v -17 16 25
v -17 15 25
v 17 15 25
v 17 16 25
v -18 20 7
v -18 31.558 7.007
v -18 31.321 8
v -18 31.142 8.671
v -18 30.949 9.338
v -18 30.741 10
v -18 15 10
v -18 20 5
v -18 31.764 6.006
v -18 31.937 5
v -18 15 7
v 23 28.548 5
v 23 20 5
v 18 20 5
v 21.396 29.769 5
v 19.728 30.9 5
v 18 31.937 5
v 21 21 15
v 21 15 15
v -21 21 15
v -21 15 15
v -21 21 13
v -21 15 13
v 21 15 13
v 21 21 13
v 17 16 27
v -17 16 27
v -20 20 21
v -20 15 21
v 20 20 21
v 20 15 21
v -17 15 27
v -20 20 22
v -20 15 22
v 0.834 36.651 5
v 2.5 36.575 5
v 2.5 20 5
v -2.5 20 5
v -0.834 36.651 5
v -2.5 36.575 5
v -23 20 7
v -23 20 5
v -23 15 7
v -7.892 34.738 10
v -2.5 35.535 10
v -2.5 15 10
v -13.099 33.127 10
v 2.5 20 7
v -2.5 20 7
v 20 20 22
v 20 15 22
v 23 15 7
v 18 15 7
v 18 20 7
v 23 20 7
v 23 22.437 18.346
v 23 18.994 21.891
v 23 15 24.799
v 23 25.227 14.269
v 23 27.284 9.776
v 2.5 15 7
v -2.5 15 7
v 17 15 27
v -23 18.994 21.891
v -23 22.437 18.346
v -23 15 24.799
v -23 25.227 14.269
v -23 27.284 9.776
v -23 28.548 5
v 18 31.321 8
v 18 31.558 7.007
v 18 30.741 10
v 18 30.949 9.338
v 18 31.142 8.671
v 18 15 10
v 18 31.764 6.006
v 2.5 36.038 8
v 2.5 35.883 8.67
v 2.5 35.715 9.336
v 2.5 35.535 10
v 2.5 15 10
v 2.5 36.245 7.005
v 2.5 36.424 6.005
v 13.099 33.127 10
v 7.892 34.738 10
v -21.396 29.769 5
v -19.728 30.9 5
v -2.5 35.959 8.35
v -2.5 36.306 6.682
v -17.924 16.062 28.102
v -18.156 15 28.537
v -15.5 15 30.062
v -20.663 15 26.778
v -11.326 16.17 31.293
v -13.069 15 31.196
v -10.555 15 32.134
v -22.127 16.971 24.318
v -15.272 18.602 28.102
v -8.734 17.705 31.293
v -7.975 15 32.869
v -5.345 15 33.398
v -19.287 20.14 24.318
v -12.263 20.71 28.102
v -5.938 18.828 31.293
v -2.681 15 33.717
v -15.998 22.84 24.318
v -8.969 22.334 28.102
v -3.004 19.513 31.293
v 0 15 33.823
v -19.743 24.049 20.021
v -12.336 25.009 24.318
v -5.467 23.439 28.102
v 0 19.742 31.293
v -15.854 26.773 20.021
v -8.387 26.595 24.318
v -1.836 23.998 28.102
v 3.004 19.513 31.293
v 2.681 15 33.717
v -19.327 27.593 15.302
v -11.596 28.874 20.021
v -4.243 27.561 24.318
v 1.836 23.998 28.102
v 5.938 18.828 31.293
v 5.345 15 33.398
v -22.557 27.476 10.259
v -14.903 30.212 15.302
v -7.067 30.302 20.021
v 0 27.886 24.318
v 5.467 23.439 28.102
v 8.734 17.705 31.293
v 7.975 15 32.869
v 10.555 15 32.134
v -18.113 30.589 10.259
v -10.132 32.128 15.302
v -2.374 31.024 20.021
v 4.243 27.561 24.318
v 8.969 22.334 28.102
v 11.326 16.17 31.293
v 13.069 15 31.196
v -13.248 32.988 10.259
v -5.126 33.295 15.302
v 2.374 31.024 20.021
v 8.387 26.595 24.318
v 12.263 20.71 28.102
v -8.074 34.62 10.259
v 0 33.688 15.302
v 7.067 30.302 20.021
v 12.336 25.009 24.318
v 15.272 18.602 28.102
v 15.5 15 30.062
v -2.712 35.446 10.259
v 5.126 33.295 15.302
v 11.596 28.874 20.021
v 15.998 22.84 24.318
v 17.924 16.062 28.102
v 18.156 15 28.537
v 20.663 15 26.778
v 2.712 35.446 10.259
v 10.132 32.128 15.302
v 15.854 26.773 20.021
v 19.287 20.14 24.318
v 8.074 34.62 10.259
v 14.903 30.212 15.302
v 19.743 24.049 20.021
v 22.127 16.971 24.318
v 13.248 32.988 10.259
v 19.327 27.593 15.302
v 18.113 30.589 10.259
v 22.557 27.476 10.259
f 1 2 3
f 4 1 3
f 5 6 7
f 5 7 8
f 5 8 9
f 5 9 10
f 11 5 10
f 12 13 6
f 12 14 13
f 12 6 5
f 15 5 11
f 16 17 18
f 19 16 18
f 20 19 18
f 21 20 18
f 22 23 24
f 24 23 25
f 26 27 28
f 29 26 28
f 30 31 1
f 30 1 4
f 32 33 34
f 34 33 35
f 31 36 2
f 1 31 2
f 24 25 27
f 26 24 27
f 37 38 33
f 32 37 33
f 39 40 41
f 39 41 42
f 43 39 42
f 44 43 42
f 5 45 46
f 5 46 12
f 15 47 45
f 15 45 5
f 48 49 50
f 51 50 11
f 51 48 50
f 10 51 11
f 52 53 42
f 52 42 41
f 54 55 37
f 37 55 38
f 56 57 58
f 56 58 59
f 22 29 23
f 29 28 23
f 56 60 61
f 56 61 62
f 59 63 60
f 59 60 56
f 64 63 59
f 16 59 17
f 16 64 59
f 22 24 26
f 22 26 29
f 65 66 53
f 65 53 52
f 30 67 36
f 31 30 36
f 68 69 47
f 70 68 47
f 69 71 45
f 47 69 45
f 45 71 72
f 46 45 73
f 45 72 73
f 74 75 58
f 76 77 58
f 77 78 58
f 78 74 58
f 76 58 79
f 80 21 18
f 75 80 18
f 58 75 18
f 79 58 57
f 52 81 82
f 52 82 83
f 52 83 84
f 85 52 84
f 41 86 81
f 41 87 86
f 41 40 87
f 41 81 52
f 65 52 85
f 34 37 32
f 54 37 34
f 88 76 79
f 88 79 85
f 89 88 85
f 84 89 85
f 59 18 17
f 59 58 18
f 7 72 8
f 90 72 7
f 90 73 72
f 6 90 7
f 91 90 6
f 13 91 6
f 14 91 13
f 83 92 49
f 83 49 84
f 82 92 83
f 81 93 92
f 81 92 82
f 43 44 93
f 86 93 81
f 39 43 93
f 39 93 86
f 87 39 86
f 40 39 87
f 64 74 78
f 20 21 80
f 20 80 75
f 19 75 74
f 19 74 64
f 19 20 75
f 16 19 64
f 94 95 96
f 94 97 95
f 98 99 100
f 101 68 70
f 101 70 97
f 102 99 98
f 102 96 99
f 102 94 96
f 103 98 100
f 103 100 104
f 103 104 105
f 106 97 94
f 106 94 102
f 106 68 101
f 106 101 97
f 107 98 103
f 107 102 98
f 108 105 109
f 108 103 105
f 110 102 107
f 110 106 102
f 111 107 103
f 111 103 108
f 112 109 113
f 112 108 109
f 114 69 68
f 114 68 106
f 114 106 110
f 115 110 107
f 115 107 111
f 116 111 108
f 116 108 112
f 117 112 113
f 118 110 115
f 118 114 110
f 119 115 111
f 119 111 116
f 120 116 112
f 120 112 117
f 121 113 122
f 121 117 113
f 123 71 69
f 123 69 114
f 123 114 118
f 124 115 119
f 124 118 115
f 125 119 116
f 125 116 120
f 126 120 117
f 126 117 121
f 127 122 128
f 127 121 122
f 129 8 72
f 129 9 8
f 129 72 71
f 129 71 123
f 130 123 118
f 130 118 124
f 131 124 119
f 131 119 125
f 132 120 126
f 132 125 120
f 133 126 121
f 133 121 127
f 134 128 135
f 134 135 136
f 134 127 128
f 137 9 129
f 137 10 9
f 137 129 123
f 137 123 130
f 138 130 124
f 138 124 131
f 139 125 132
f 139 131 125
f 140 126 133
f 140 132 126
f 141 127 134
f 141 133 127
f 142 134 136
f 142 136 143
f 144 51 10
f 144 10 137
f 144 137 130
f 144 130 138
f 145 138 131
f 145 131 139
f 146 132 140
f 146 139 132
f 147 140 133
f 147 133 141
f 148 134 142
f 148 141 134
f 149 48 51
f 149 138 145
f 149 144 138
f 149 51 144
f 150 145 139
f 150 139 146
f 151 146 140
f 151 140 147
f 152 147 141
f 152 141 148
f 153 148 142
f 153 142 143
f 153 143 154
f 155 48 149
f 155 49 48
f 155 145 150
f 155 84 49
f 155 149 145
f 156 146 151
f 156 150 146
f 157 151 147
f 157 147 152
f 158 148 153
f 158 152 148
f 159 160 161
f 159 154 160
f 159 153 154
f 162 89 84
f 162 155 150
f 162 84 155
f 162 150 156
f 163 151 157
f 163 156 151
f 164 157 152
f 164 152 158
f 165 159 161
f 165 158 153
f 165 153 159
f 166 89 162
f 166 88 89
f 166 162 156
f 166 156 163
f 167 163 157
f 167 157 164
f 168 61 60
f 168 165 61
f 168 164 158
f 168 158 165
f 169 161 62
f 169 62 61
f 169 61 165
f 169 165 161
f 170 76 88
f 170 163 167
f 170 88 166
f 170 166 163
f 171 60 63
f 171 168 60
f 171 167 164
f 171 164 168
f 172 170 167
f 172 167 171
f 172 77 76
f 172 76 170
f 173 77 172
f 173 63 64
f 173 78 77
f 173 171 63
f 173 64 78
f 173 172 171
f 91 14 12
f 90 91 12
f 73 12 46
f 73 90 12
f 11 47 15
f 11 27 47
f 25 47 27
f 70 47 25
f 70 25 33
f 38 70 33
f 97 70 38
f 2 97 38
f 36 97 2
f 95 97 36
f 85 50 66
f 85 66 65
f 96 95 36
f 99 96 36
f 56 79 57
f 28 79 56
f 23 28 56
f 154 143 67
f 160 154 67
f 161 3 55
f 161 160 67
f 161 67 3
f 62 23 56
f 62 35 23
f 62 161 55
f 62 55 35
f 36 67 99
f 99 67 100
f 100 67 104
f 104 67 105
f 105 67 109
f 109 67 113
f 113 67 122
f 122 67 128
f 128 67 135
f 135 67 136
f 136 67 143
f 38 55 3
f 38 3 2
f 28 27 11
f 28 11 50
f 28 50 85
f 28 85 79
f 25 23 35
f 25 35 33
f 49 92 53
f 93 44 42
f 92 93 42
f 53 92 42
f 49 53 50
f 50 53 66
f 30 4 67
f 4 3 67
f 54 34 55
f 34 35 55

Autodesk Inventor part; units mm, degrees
sketch "スケッチ1" plane through (0, 0, 0) normal (0, 1, 0) x (-1, 0, 0)
  circle A0 centre (0, 0) radius 37
  line L0 (0, 0) -> (0, -37)
  line L1 (0, 0) -> (0, 37)
  dimension "d0" = 74
revolve "回転1" add sketch "スケッチ1" angle 180 about axis through (0, 0, 0) along (0, 0, 1) picked at (-2.7444, -24.3574) contours L1 L0 A0
sketch "スケッチ5" plane through (0, 0, 0) normal (0, -1, 0) x (1, 0, 0)
  line L0 (-20, -25) -> (20, -25)
  line L1 (20, -25) -> (20, -15)
  line L2 (20, -15) -> (-20, -15)
  line L3 (-20, -15) -> (-20, -25)
  line L4 (-20, -17) -> (-20, -15)
  line L5 (0, 27) -> (-17, 27)
  line L6 (-17, 27) -> (-17, 25)
  line L7 (-17, 25) -> (0, 25)
  line L8 (0, 25) -> (0, 27)
  line L9 (0, 22) -> (-20, 22)
  line L10 (-20, 22) -> (-20, 21)
  line L11 (-20, 21) -> (0, 21)
  line L12 (0, 21) -> (0, 22)
  line L13 (0, 15) -> (-21, 15)
  line L14 (-21, 15) -> (-21, 13)
  line L15 (-21, 13) -> (0, 13)
  line L16 (0, 13) -> (0, 15)
  line L17 (0, 7) -> (-23, 7)
  line L18 (-23, 7) -> (-23, 5)
  line L19 (-23, 5) -> (0, 5)
  line L20 (0, 5) -> (0, 7)
  circle A0 centre (0, 0) radius 37 projected
  circle A1 centre (0, 0) radius 37 projected
  line L21 (0, 37) -> (0, -37)
  line L22 (37, 0) -> (-37, 0)
  line L23 (-32, 4) -> (-23, 4)
  line L24 (-23, 4) -> (-23, -6)
  line L25 (-23, -6) -> (-32, -6)
  line L26 (-32, -6) -> (-32, 4)
  line L27 (-23, -8.0262) -> (-23, 4)
  line L28 (-27, 25.2982) -> (-27, -25.2982)
  line L29 (-15.5, 27) -> (-12, 27)
  line L30 (-12, 27) -> (-12, 35)
  line L31 (-12, 35) -> (-15.5, 35)
  line L32 (-15.5, 35) -> (-15.5, 27)
  line L33 (-15.5, 25) -> (0, 25)
  line L34 (0, 25) -> (0, 22)
  line L35 (0, 22) -> (-15.5, 22)
  line L36 (-15.5, 22) -> (-15.5, 25)
  line L37 (-19, 15) -> (0, 15)
  line L38 (0, 15) -> (0, 21)
  line L39 (0, 21) -> (-19, 21)
  line L40 (-19, 21) -> (-19, 15)
  line L41 (-19, 13) -> (0, 13)
  line L42 (0, 13) -> (0, 7)
  line L43 (0, 7) -> (-19, 7)
  line L44 (-19, 7) -> (-19, 13)
  line L45 (-23, -1) -> (-39.6865, -1)
  line L46 (-23, -1) -> (-7.8337, -1)
  line L47 (-8, 5) -> (-23, 5)
  line L48 (-23, 5) -> (-23, -7)
  line L49 (-23, -7) -> (-8, -7)
  line L50 (-8, -7) -> (-8, 5)
  line L51 (-8, 5) -> (-23, -7) construction
  line L52 (-23, 5) -> (-8, -7) construction
  line L53 (-23, 6) -> (-33, 6)
  line L54 (-33, 6) -> (-33, -8)
  line L55 (-33, -8) -> (-23, -8)
  line L56 (-23, -8) -> (-23, 6)
  line L57 (-23, 6) -> (-33, -8) construction
  line L58 (-33, 6) -> (-23, -8) construction
  line L59 (-8, 5) -> (-1, 5)
  line L60 (-1, 5) -> (-1, -7)
  line L61 (-1, -7) -> (-8, -7)
  line L62 (-8, -7) -> (-8, 5)
  line L63 (-8, 5) -> (-1, -7) construction
  line L64 (-1, 5) -> (-8, -7) construction
  line L65 (-23, 4) -> (-27, 4)
  line L66 (-23, -6) -> (-27, -6)
  line L67 (-23, 6) -> (-27, 6)
  line L68 (-23, -8) -> (-27, -8)
  line L69 (26.3249, -26) -> (-26.3249, -26)
  line L70 (-8, 5) -> (-6.8, 5)
  line L71 (-6.8, 5) -> (-6.8, -7)
  line L72 (-6.8, -7) -> (-8, -7)
  line L73 (-8, -7) -> (-8, 5)
  line L74 (-3, 7) -> (0, 7)
  line L75 (0, 22) -> (-4, 22)
  line L76 (-4, 21) -> (0, 21)
  line L77 (0, 21) -> (0, 22)
  line L78 (-6, 7) -> (-1, 7)
  line L79 (-1, 5) -> (-6, 5)
  point P0 (0, -25)
  point P1 (0, -15)
  point P2 (0, 26)
  point P3 (0, 21.5)
  point P4 (0, 14)
  point P5 (0, 6)
  point P6 (-20, -20)
  point P7 (-27, -0.5262)
  point P8 (-15.5, 23.5)
  point P9 (-15.5, 33.5969)
  point P10 (0, 27)
  point P11 (0, 37)
  point P12 (0, 25)
  point P13 (0, 13)
  point P14 (0, 15)
  point P15 (-27, 0)
  point P16 (-32, 0)
  point P17 (-23, 0)
  point P18 (-15.5, -1)
  point P19 (-28, -1)
  point P20 (-4.5, -1)
  point P21 (-8, 5)
  point P22 (-27, 0.5)
  point P23 (-28, 0.4738)
  point P24 (-28, -11.5262)
  point P25 (-27, -11.5)
  point P26 (-23, -6)
  point P27 (-23, 4)
  point P28 (-23, 4)
  point P29 (-23, -6)
  point P30 (-23, -7)
  point P31 (-8, 0)
  point P32 (-1, 0)
  point P33 (-26.3249, -26)
  point P34 (0, 22)
  point P35 (-27, 6)
  point P36 (-19, 10)
  dimension "d12" = 40
  dimension "d13" = 10
  dimension "d23" = 17
  dimension "d24" = 2
  dimension "d27" = 20
  dimension "d28" = 1
  dimension "d30" = 21
  dimension "d31" = 2
  dimension "d33" = 2
  dimension "d88" = 0
  dimension "d89" = 0
  dimension "d90" = 12
  dimension "d92" = 20
  dimension "d93" = 10
  dimension "d97" = 9
  dimension "d98" = 10
  dimension "d113" = 27
  dimension "d122" = 15.5
  dimension "d123" = 35
  dimension "d124" = 3
  dimension "d125" = 15.5
  dimension "d126" = 6
  dimension "d127" = 6
  dimension "d147" = 12
  dimension "d149" = 8
  dimension "d151" = 15
  dimension "d161" = 14
  dimension "d162" = 10
  dimension "d164" = 12
  dimension "d165" = 7
  dimension "d170" = 26
  dimension "d175" = 1.2
  dimension "d207" = 0
  dimension "d283" = 2
  dimension "d284" = 2
extrude "GNSボード" cut sketch "スケッチ5" against normal blind 16 contours L8 L7 L6 L5
extrude "GNSボード止めるよう" cut sketch "スケッチ5" against normal blind 15 contours L21 L5 L30 A0 | L30 L5 L32 A0 | L21 L9 L36 L7
extrude "アルミ板１" cut sketch "スケッチ5" against normal blind 20 contours L11 L10 L9 L12
extrude "メイン基板" cut sketch "スケッチ5" against normal blind 21 contours L15 L14 L13 L16
extrude "メイン止めるよう" cut sketch "スケッチ5" against normal blind 14.5 contours L17 L44 L15 L21 | L13 L40 L11 L21
extrude "アルミ板２" cut sketch "スケッチ5" against normal blind 20 contours L19 L18 L17 L20
extrude "電池ボックス入れ" cut sketch "スケッチ5" against normal blind 13 contours L3 L2 L21 L0 | L21 L2 L1 L0
extrude "side ut" cut sketch "スケッチ5" against normal blind 100 contours A0 L45 L54 L55 L28 | A0 L22 L54 L45 | L55 L54 L45 L26 L25 L28 | A0 L28 L53 L54 L22 | L54 L22 L26 L45 | L25 L26 L45 L28 | L54 L53 L28 L23 L26 L22 | L26 L22 L28 L45 | L22 L26 L23 L28
extrude "motor case" add sketch "スケッチ5" against normal blind 7 contours L55 L54 L45 L26 L25 L28 | L28 L25 L27 L55 | L50 L46 L24 L22 | L22 L24 L48 L19 L50 | L54 L22 L26 L45 | L28 L45 L24 L25 | L25 L26 L45 L28 | L24 L45 L28 L22 | L22 L28 L23 L24 | L50 L49 L27 L24 L46 | L54 L53 L28 L23 L26 L22 | L26 L22 L28 L45 | L22 L26 L23 L28 | L23 L28 L53 L18 L48
extrude "bottom cut" cut sketch "スケッチ5" against normal blind 90 contours L69 A0 L21 | L21 A0 L69
extrude "motor" cut sketch "スケッチ5" against normal blind 6 contours L60 L61 L71 L22 | L22 L71 L19 L60 | L71 L61 L50 L22 | L22 L50 L19 L71 | L50 L46 L24 L22 | L22 L24 L48 L19 L50 | L28 L45 L24 L25 | L25 L26 L45 L28 | L24 L45 L28 L22 | L22 L28 L23 L24 | L50 L49 L27 L24 L46 | L26 L22 L28 L45 | L22 L26 L23 L28
extrude "motor block" add sketch "スケッチ5" against normal blind 10 contours L71 L61 L50 L22 | L22 L50 L19 L71
sketch "スケッチ27" plane through (-33, 0, -8) normal (-1, 0, 0) x (0, 0, 1)
  line L0 (14, 0) -> (0, 0) projected
  circle A0 centre (7, 0) radius 3
  point P0 (8, 0)
  dimension "d198" = 6
extrude "押し出し36" cut sketch "スケッチ27" against normal blind 27
mirror "ミラー13" about plane through (0, 0, 0) normal (1, 0, 0) of "メイン止めるよう", "メイン基板", "アルミ板１", "GNSボード止めるよう", "GNSボード", "アルミ板２", "motor", "motor case", "押し出し36", "電池ボックス入れ", "side ut", "motor block"
ref_plane "作業平面5" through (-17, 17.5, 25) normal (0, -1, 0) x (1, 0, 0)
ref_plane "作業平面6" through (20, 13, -15) normal (0, 0, -1) x (1, 0, 0)
sketch "スケッチ38" plane through (20, 13, -15) normal (0, 0, -1) x (1, 0, 0)
  line L0 (-40, 13) -> (0, 13) projected
  line L1 (-40, 13) -> (-40, 0) projected
  line L2 (-40, 0) -> (0, 0) projected
  line L3 (0, 13) -> (0, 0) projected
  line L4 (-38, 6) -> (-28, 6)
  line L5 (-28, 6) -> (-28, -3)
  line L6 (-28, -3) -> (-38, -3)
  line L7 (-38, -3) -> (-38, 6)
  point P0 (-20, 13)
  dimension "d235" = 3
  dimension "d236" = 9
  dimension "d237" = 10
  dimension "d238" = 2
extrude "押し出し44" cut sketch "スケッチ38" against normal blind 18 contours L7 L4 L5 L2 | L2 L5 L6 L7
ref_plane "作業平面7" through (27, 35, 6) normal (0, -1, 0) x (1, 0, 0)
sketch "スケッチ41" plane through (-17, 0, 25) normal (0, -1, 0) x (1, 0, 0)
  line L0 (-16, -23) -> (-15, -23) projected
  line L1 (-15, -23) -> (-15, -21) projected
  line L2 (-15, -21) -> (-6, -21) projected
  line L3 (-6, -21) -> (-6, -18) projected
  line L4 (-6, -18) -> (-2, -18) projected
  line L5 (-2, -18) -> (-2, -12) projected
  line L6 (-2, -12) -> (-4, -12) projected
  line L7 (-4, -12) -> (-4, -10) projected
  line L8 (-4, -10) -> (-2, -10) projected
  line L9 (-2, -10) -> (-2, -4) projected
  line L10 (-2, -4) -> (-3, -4) projected
  line L11 (-3, -4) -> (-3, -3) projected
  line L12 (-3, -3) -> (1.5, -3) projected
  line L13 (1.5, -3) -> (1.5, 0) projected
  line L14 (1.5, 0) -> (0, 0) projected
  line L15 (0, 0) -> (0, 2) projected
  line L16 (0, 2) -> (1.5, 2) projected
  line L17 (1.5, 2) -> (1.5, 8.5969) projected
  arc A0 (1.5, 8.5969) -> (-10, 0.2982) centre (17, -25) ccw projected
  line L18 (-10, 0.2982) -> (-10, -19) projected
  line L19 (-10, -19) -> (-16, -19) projected
  line L20 (-16, -19) -> (-16, -23) projected
  line L21 (-2, -18) -> (-2, -12) projected
  line L22 (-4, -10) -> (-4, -12) projected
  line L23 (0, 2) -> (0, 0) projected
  circle A1 centre (-4, 0) radius 2
  dimension "d252" = 4
  dimension "d253" = 4
  dimension "d254" = 3
extrude "押し出し46" cut sketch "スケッチ41" against normal blind 10 contours A1
mirror "ミラー15" about plane through (0, 0, 0) normal (1, 0, 0) of "押し出し46"
sketch "スケッチ42" plane through (-33, 0, -8) normal (0, -1, 0) x (1, 0, 0)
  circle A0 centre (9.5, -8) radius 2
  line L0 (13, -17) -> (13, -7) projected
  line L1 (10, 2) -> (1, 2) projected
  point P0 (33, 8)
  dimension "d257" = 3.5
  dimension "d258" = 4
  dimension "d259" = 10
extrude "押し出し47" cut sketch "スケッチ42" against normal blind 10
mirror "ミラー16" about plane through (0, 0, 0) normal (1, 0, 0) of "押し出し47"
ref_plane "作業平面8" through (-17, 15, 25) normal (0, -1, 0) x (1, 0, 0)
sketch "スケッチ45" plane through (-17, 15, 25) normal (0, -1, 0) x (1, 0, 0)
  circle A0 centre (-4, 0) radius 2 projected
  line L0 (-16, -23) -> (-15, -23) projected
  line L1 (-15, -23) -> (-15, -21) projected
  line L2 (-15, -21) -> (-6, -21) projected
  line L3 (-6, -21) -> (-6, -18) projected
  line L4 (-6, -18) -> (-2, -18) projected
  line L5 (-2, -18) -> (-2, -12) projected
  line L6 (-2, -12) -> (-4, -12) projected
  line L7 (-4, -12) -> (-4, -10) projected
  line L8 (-4, -10) -> (-2, -10) projected
  line L9 (-2, -10) -> (-2, -4) projected
  line L10 (-2, -4) -> (-3, -4) projected
  line L11 (-3, -4) -> (-3, -3) projected
  line L12 (-3, -3) -> (1.5, -3) projected
  line L13 (1.5, -3) -> (1.5, 0) projected
  line L14 (1.5, 0) -> (0, 0) projected
  line L15 (0, 0) -> (0, 2) projected
  line L16 (0, 2) -> (1.5, 2) projected
  line L17 (1.5, 2) -> (1.5, 8.5969) projected
  arc A1 (1.5, 8.5969) -> (-10, 0.2982) centre (17, -25) ccw projected
  line L18 (-10, 0.2982) -> (-10, -19) projected
  line L19 (-10, -19) -> (-16, -19) projected
  line L20 (-16, -19) -> (-16, -23) projected
  arc A2 (32.5, 5.0624) -> (1.5, 5.0624) centre (17, -25) ccw projected
  line L21 (1.5, 2) -> (1.5, 5.0624) projected
  line L22 (32.5, 2) -> (1.5, 2) projected
  line L23 (32.5, 2) -> (32.5, 5.0624) projected
  circle A3 centre (38, 0) radius 2 projected
  circle A4 centre (38, 0) radius 2 projected
  line L24 (49, -23) -> (50, -23) projected
  line L25 (50, -19) -> (50, -23) projected
  line L26 (44, -19) -> (50, -19) projected
  line L27 (44, -19) -> (44, 0.2982) projected
  arc A5 (44, 0.2982) -> (32.5, 8.5969) centre (17, -25) ccw projected
  line L28 (32.5, 8.5969) -> (32.5, 2) projected
  line L29 (32.5, 2) -> (34, 2) projected
  line L30 (34, 2) -> (34, 0) projected
  line L31 (34, 0) -> (32.5, 0) projected
  line L32 (32.5, 0) -> (32.5, -3) projected
  line L33 (32.5, -3) -> (37, -3) projected
  line L34 (37, -3) -> (37, -4) projected
  line L35 (37, -4) -> (36, -4) projected
  line L36 (36, -4) -> (36, -10) projected
  line L37 (36, -10) -> (38, -10) projected
  line L38 (38, -10) -> (38, -12) projected
  line L39 (38, -12) -> (36, -12) projected
  line L40 (36, -12) -> (36, -18) projected
  line L41 (36, -18) -> (40, -18) projected
  line L42 (40, -18) -> (40, -21) projected
  line L43 (40, -21) -> (49, -21) projected
  line L44 (49, -21) -> (49, -23) projected
  circle A6 centre (-4, 0) radius 2 projected
  line L45 (1.5, 0) -> (32.5, 0) projected
  line L46 (32.5, -3) -> (1.5, -3) projected
  line L47 (32.5, -3) -> (32.5, 0) projected
  line L48 (1.5, 0) -> (32.5, 0) projected
  line L49 (1.5, -3) -> (1.5, 0) projected
  line L50 (34, 0) -> (0, 0) projected
  line L51 (34, 0) -> (34, 2) projected
  line L52 (34, 2) -> (0, 2) projected
  line L53 (0, 0) -> (0, 2) projected
  line L54 (36, -10) -> (-2, -10) projected
  line L55 (36, -10) -> (36, -4) projected
  line L56 (-2, -4) -> (36, -4) projected
  line L57 (-2, -10) -> (-2, -4) projected
  line L58 (38, -12) -> (-4, -12) projected
  line L59 (38, -12) -> (38, -10) projected
  line L60 (38, -10) -> (-4, -10) projected
  line L61 (-4, -12) -> (-4, -10) projected
  line L62 (36, -18) -> (-2, -18) projected
  line L63 (36, -18) -> (36, -12) projected
  line L64 (-2, -12) -> (36, -12) projected
  line L65 (-2, -18) -> (-2, -12) projected
  line L66 (40, -20) -> (-6, -20) projected
  line L67 (40, -20) -> (40, -18) projected
  line L68 (40, -18) -> (-6, -18) projected
  line L69 (-6, -20) -> (-6, -18) projected
  circle A7 centre (40.5, -41) radius 2 projected
  circle A8 centre (-6.5, -41) radius 2 projected
  line L70 (25, -29) -> (23.8, -29) projected
  line L71 (23.8, -32) -> (23.8, -29) projected
  line L72 (23.8, -32) -> (18, -32) projected
  line L73 (18, -32) -> (18, -20) projected
  line L74 (18, -20) -> (16, -20) projected
  line L75 (16, -20) -> (16, -32) projected
  line L76 (16, -32) -> (10.2, -32) projected
  line L77 (10.2, -32) -> (10.2, -29) projected
  line L78 (10.2, -29) -> (9, -29) projected
  line L79 (9, -29) -> (9, -32) projected
  line L80 (9, -32) -> (-6, -32) projected
  line L81 (-6, -32) -> (-6, -31) projected
  line L82 (-6, -31) -> (-15, -31) projected
  line L83 (-15, -31) -> (-15, -29) projected
  line L84 (-15, -29) -> (-16, -29) projected
  line L85 (-16, -29) -> (-16, -33) projected
  line L86 (-16, -33) -> (-10, -33) projected
  line L87 (-10, -33) -> (-10, -50.2982) projected
  arc A9 (-10, -50.2982) -> (-9.3249, -51) centre (17, -25) ccw projected
  line L88 (-9.3249, -51) -> (43.3249, -51) projected
  arc A10 (43.3249, -51) -> (44, -50.2982) centre (17, -25) ccw projected
  line L89 (44, -50.2982) -> (44, -33) projected
  line L90 (50, -33) -> (44, -33) projected
  line L91 (50, -29) -> (50, -33) projected
  line L92 (50, -29) -> (49, -29) projected
  line L93 (49, -29) -> (49, -31) projected
  line L94 (49, -31) -> (40, -31) projected
  line L95 (40, -31) -> (40, -32) projected
  line L96 (40, -32) -> (25, -32) projected
  line L97 (25, -29) -> (25, -32) projected
  line L98 (-3, -40) -> (37, -40) projected
  line L99 (37, -40) -> (37, -50) projected
  line L100 (37, -50) -> (-3, -50) projected
  line L101 (-3, -50) -> (-3, -40) projected
  line L102 (-6, -18) -> (40, -18)
  line L103 (40, -18) -> (40, 8.8231)
  line L104 (40, 8.8231) -> (-6, 8.8231)
  line L105 (-6, 8.8231) -> (-6, -18)
  arc A11 (32.5, 5.0624) -> (1.5, 5.0624) centre (17, -25) ccw projected
  line L106 (32.5, 5.0624) -> (32.5, 8.5969) projected
  arc A12 (44, 0.2982) -> (32.5, 8.5969) centre (17, -25) ccw projected
  line L107 (44, 0.2982) -> (44, -50.2982) projected
  arc A13 (43.3249, -51) -> (44, -50.2982) centre (17, -25) ccw projected
  line L108 (43.3249, -51) -> (-9.3249, -51) projected
  arc A14 (-10, -50.2982) -> (-9.3249, -51) centre (17, -25) ccw projected
  line L109 (-10, -50.2982) -> (-10, 0.2982) projected
  arc A15 (1.5, 8.5969) -> (-10, 0.2982) centre (17, -25) ccw projected
  line L110 (1.5, 8.5969) -> (1.5, 5.0624) projected
  line L111 (9, -32) -> (9, -20) projected
  line L112 (-6, -20) -> (9, -20) projected
  line L113 (-6, -21) -> (-6, -20) projected
  line L114 (-15, -21) -> (-6, -21) projected
  line L115 (-15, -31) -> (-15, -21) projected
  line L116 (-6, -31) -> (-15, -31) projected
  line L117 (-6, -32) -> (-6, -31) projected
  line L118 (9, -32) -> (-6, -32) projected
  line L119 (50, -29) -> (49, -29) projected
  line L120 (50, -23) -> (50, -29) projected
  line L121 (49, -23) -> (50, -23) projected
  line L122 (49, -29) -> (49, -23) projected
  line L123 (-16, -23) -> (-15, -23) projected
  line L124 (-16, -29) -> (-16, -23) projected
  line L125 (-15, -29) -> (-16, -29) projected
  line L126 (-15, -23) -> (-15, -29) projected
  point P0 (-10, -19)
  point P1 (-10, -33)
  point P2 (44, -33)
  point P3 (44, -19)
  point P4 (40, 3.9828)
  point P5 (40, -18)
  point P6 (40, -20)
  point P7 (-6, -20)
  point P8 (-6, -18)
  point P9 (-6, 3.9828)
  point P10 (-10, -33)
  point P11 (-10, -31)
  point P12 (44, -31)
  point P13 (44, -33)
  point P14 (50, -29)
  point P15 (50, -23)
  point P16 (44, -19)
  point P17 (-16, -23)
  point P18 (-16, -29)
  point P19 (-10, -19)
extrude "side and front cut" cut sketch "スケッチ45" along normal mid plane 100 contours L105 L3 L2 L109 L18 A1 | L66 L111 L79 L80 L81 L82 L109 L2 L3 | L109 L2 L1 L0 L20 L19 | L66 L75 L76 L77 L78 L111 | L109 L82 L83 L115 L1 L2 | L66 L73 L72 L71 L70 L97 L96 L95 L94 L107 L89 A10 L88 A9 L87 L109 L82 L81 L80 L79 L78 L77 L76 L75 | L103 A5 L27 L107 L43 L42 | L0 L115 L84 L124 | L109 L86 L85 L84 L83 L82 | L66 L42 L43 L107 L94 L95 L96 L97 L70 L71 L72 L73 | L26 L25 L24 L44 L43 L107 | L43 L44 L122 L93 L94 L107 | L94 L93 L92 L91 L90 L107 | L120 L92 L122 L24 | A7 | A8 | L98 L99 L100 L101
sketch "スケッチ46" plane through (-17, 15, 25) normal (0, -1, 0) x (1, 0, 0)
  line L0 (-6, 0) -> (-6, -18) projected
  line L1 (-6, -18) -> (-2, -18) projected
  line L2 (-2, -18) -> (-2, -12) projected
  line L3 (-2, -12) -> (-4, -12) projected
  line L4 (-4, -12) -> (-4, -10) projected
  line L5 (-4, -10) -> (-2, -10) projected
  line L6 (-2, -10) -> (-2, -4) projected
  line L7 (-2, -4) -> (-3, -4) projected
  line L8 (-3, -4) -> (-3, -3) projected
  line L9 (-3, -3) -> (1.5, -3) projected
  line L10 (1.5, -3) -> (1.5, 0) projected
  line L11 (1.5, 0) -> (0, 0) projected
  line L12 (0, 0) -> (0, 2) projected
  line L13 (0, 2) -> (1.5, 2) projected
  line L14 (1.5, 2) -> (1.5, 8.5969) projected
  arc A0 (1.5, 8.5969) -> (-6, 3.9828) centre (17, -25) ccw projected
  line L15 (-6, 3.9828) -> (-6, 0) projected
  circle A1 centre (-4, 0) radius 2 projected
  circle A2 centre (-4, 0) radius 2 projected
  line L16 (40, -18) -> (40, 0) projected
  circle A3 centre (38, 0) radius 2 projected
  line L17 (40, 0) -> (40, 3.9828) projected
  arc A4 (40, 3.9828) -> (32.5, 8.5969) centre (17, -25) ccw projected
  line L18 (32.5, 8.5969) -> (32.5, 2) projected
  line L19 (32.5, 2) -> (34, 2) projected
  line L20 (34, 2) -> (34, 0) projected
  line L21 (34, 0) -> (32.5, 0) projected
  line L22 (32.5, 0) -> (32.5, -3) projected
  line L23 (32.5, -3) -> (37, -3) projected
  line L24 (37, -3) -> (37, -4) projected
  line L25 (37, -4) -> (36, -4) projected
  line L26 (36, -4) -> (36, -10) projected
  line L27 (36, -10) -> (38, -10) projected
  line L28 (38, -10) -> (38, -12) projected
  line L29 (38, -12) -> (36, -12) projected
  line L30 (36, -12) -> (36, -18) projected
  line L31 (36, -18) -> (40, -18) projected
  arc A5 (32.5, 5.0624) -> (1.5, 5.0624) centre (17, -25) ccw projected
  line L32 (1.5, 2) -> (1.5, 5.0624) projected
  line L33 (32.5, 2) -> (1.5, 2) projected
  line L34 (32.5, 2) -> (32.5, 5.0624) projected
  line L35 (34, 0) -> (0, 0) projected
  line L36 (34, 0) -> (34, 2) projected
  line L37 (34, 2) -> (0, 2) projected
  line L38 (0, 0) -> (0, 2) projected
  line L39 (32.5, -3) -> (1.5, -3) projected
  line L40 (32.5, -3) -> (32.5, 0) projected
  line L41 (1.5, 0) -> (32.5, 0) projected
  line L42 (1.5, -3) -> (1.5, 0) projected
  line L43 (36, -10) -> (-2, -10) projected
  line L44 (36, -10) -> (36, -4) projected
  line L45 (-2, -4) -> (36, -4) projected
  line L46 (-2, -10) -> (-2, -4) projected
  line L47 (36, -18) -> (-2, -18) projected
  line L48 (36, -18) -> (36, -12) projected
  line L49 (-2, -12) -> (36, -12) projected
  line L50 (-2, -18) -> (-2, -12) projected
  point P0 (1.5, 5.0624)
  point P1 (-2, -18)
  point P2 (36, -18)
extrude "front cut 2" cut sketch "スケッチ46" along normal blind 100 contours L15 A0 L14 L13 L12 L11 L10 L9 L8 L7 L6 L5 L4 L3 L2 L1 L0 | A1 | L2 L49 L30 L47 | L3 L4 L5 L43 L27 L28 L29 L49 | A3 | L30 L29 L28 L27 L26 L25 L24 L23 L22 L21 L20 L19 L18 A4 L17 L16 L31 | A5 L18 L33 L14 | L33 L19 L20 L21 L35 L11 L12 L13 | L6 L45 L26 L43 | L7 L8 L9 L39 L23 L24 L25 L45 | L35 L22 L39 L10
sketch "スケッチ48" plane through (0, 0, 5) normal (0, 0, -1) x (-1, 0, 0)
  line L0 (-23, 20) -> (23, 20) projected
  line L1 (23, 28.5482) -> (23, 20) projected
  arc A0 (23, 28.5482) -> (-23, 28.5482) centre (0, 0) ccw projected
  line L2 (-23, 28.5482) -> (-23, 20) projected
  line L3 (-23, 15) -> (23, 15) projected
  line L4 (-23, 15) -> (-23, 20) projected
  line L5 (23, 15) -> (23, 20) projected
  line L6 (-23, 40) -> (-18, 40)
  line L7 (-18, 40) -> (-18, 15)
  line L8 (-18, 15) -> (-23, 15)
  line L9 (-23, 15) -> (-23, 40)
  line L10 (18, 40) -> (23, 40)
  line L11 (23, 40) -> (23, 15)
  line L12 (23, 15) -> (18, 15)
  line L13 (18, 15) -> (18, 40)
  line L14 (-2.5, 36.6606) -> (2.5, 36.6606)
  line L15 (2.5, 36.6606) -> (2.5, 20)
  line L16 (2.5, 20) -> (-2.5, 20)
  line L17 (-2.5, 20) -> (-2.5, 36.6606)
  line L18 (0, 0) -> (0, 36.6606)
  point P0 (0, 0)
  point P1 (18, 20)
  point P2 (18, 31.9374)
  point P3 (-18, 31.9374)
  point P4 (-18, 20)
  point P5 (2.5, 36.5753)
  point P6 (2.5, 20)
  point P7 (-2.5, 36.5753)
  dimension "d274" = 25
  dimension "d275" = 5
  dimension "d276" = 25
  dimension "d277" = 5
  dimension "d280" = 5
  dimension "d282" = 2.5
extrude "lock cut" cut sketch "スケッチ48" against normal blind 3 contours L7 A0 L17 L0 | L15 A0 L13 L0
sketch "スケッチ49" plane through (23, 15, 7) normal (0, 0, -1) x (-1, 0, 0)
  line L0 (46, 0) -> (0, 0) projected
  line L1 (46, -15) -> (46, 5) projected
  line L2 (0, 0) -> (46, 0)
  line L3 (46, 0) -> (46, 5)
  line L4 (46, 5) -> (0, 5)
  line L5 (0, 5) -> (0, 0)
  point P0 (23, -15)
  point P1 (38.5, 0)
  point P2 (7.5, 0)
extrude "押し出し52" cut sketch "スケッチ49" against normal up to surface (1 mm away)
sketch "スケッチ50" plane through (0, 0, 5) normal (0, 0, -1) x (-1, 0, 0)
  point P0 (0, 0)
sketch "スケッチ51" plane through (0, 0, 8) normal (0, 0, -1) x (-1, 0, 0)
  line L0 (-23, 15) -> (-23, 28.5482) projected
  line L1 (18, 20) -> (23, 20) projected
  line L2 (-23, 15) -> (23, 15)
  line L3 (23, 15) -> (23, 20)
  line L4 (23, 20) -> (-23, 20)
  line L5 (-23, 20) -> (-23, 15)
  arc A0 (18, 31.3209) -> (2.5, 36.0382) centre (0, 0) ccw projected
  line L6 (2.5, 20) -> (2.5, 36.0382) projected
  line L7 (-2.5, 36.0382) -> (-2.5, 20) projected
  arc A1 (-2.5, 36.0382) -> (-18, 31.3209) centre (0, 0) ccw projected
  line L8 (-18, 20) -> (-18, 31.3209) projected
  line L9 (18, 31.3209) -> (18, 20) projected
  line L10 (-2.5, 20) -> (-18, 20) projected
  line L11 (18, 20) -> (2.5, 20) projected
  point P0 (2.5, 20)
  point P1 (-2.5, 20)
extrude "押し出し53" cut sketch "スケッチ51" against normal blind 2
sketch "スケッチ52" plane through (0, 0, 10) normal (0, 0, -1) x (-1, 0, 0)
  line L0 (-23, 20) -> (-18, 20) projected
  line L1 (-23, 20) -> (-18, 20) projected
  line L2 (-2.5, 20) -> (2.5, 20) projected
  line L3 (-2.5, 20) -> (2.5, 20) projected
  point P0 (0, 0)
sketch "スケッチ53" plane through (0, 15, 0) normal (0, -1, 0) x (1, 0, 0)
  line L0 (18, 10) -> (18, 5) projected
  line L1 (23, 5) -> (18, 5) projected
  line L2 (23, 10) -> (23, 5) projected
  line L3 (23, 10) -> (18, 10) projected
  line L4 (-2.5, 10) -> (-2.5, 5) projected
  line L5 (2.5, 5) -> (-2.5, 5) projected
  line L6 (2.5, 5) -> (2.5, 10) projected
  line L7 (2.5, 10) -> (-2.5, 10) projected
  line L8 (-18, 5) -> (-18, 10) projected
  line L9 (-18, 10) -> (-23, 10) projected
  line L10 (-23, 5) -> (-23, 10) projected
  line L11 (-18, 5) -> (-23, 5) projected
  point P0 (0, 0)
extrude "押し出し54" add sketch "スケッチ53" against normal up to surface (5 mm away)
sketch "スケッチ54" plane through (0, 15, 0) normal (0, -1, 0) x (1, 0, 0)
  line L0 (-18, 10) -> (-2.5, 10) projected
  line L1 (23, 24.7992) -> (23, 5) projected
  line L2 (23, 5) -> (-23, 5)
  line L3 (-23, 5) -> (-23, 7)
  line L4 (-23, 7) -> (23, 7)
  line L5 (23, 7) -> (23, 5)
  line L6 (18, 5) -> (23, 5) projected
  point P0 (0, 0)
  point P1 (23, 5)
  point P2 (23, 7)
  dimension "d295" = 2
  dimension "d296" = 46
extrude "押し出し55" cut sketch "スケッチ54" against normal blind 5
properties part number "body back for main 3" material "ABS プラスチック"
